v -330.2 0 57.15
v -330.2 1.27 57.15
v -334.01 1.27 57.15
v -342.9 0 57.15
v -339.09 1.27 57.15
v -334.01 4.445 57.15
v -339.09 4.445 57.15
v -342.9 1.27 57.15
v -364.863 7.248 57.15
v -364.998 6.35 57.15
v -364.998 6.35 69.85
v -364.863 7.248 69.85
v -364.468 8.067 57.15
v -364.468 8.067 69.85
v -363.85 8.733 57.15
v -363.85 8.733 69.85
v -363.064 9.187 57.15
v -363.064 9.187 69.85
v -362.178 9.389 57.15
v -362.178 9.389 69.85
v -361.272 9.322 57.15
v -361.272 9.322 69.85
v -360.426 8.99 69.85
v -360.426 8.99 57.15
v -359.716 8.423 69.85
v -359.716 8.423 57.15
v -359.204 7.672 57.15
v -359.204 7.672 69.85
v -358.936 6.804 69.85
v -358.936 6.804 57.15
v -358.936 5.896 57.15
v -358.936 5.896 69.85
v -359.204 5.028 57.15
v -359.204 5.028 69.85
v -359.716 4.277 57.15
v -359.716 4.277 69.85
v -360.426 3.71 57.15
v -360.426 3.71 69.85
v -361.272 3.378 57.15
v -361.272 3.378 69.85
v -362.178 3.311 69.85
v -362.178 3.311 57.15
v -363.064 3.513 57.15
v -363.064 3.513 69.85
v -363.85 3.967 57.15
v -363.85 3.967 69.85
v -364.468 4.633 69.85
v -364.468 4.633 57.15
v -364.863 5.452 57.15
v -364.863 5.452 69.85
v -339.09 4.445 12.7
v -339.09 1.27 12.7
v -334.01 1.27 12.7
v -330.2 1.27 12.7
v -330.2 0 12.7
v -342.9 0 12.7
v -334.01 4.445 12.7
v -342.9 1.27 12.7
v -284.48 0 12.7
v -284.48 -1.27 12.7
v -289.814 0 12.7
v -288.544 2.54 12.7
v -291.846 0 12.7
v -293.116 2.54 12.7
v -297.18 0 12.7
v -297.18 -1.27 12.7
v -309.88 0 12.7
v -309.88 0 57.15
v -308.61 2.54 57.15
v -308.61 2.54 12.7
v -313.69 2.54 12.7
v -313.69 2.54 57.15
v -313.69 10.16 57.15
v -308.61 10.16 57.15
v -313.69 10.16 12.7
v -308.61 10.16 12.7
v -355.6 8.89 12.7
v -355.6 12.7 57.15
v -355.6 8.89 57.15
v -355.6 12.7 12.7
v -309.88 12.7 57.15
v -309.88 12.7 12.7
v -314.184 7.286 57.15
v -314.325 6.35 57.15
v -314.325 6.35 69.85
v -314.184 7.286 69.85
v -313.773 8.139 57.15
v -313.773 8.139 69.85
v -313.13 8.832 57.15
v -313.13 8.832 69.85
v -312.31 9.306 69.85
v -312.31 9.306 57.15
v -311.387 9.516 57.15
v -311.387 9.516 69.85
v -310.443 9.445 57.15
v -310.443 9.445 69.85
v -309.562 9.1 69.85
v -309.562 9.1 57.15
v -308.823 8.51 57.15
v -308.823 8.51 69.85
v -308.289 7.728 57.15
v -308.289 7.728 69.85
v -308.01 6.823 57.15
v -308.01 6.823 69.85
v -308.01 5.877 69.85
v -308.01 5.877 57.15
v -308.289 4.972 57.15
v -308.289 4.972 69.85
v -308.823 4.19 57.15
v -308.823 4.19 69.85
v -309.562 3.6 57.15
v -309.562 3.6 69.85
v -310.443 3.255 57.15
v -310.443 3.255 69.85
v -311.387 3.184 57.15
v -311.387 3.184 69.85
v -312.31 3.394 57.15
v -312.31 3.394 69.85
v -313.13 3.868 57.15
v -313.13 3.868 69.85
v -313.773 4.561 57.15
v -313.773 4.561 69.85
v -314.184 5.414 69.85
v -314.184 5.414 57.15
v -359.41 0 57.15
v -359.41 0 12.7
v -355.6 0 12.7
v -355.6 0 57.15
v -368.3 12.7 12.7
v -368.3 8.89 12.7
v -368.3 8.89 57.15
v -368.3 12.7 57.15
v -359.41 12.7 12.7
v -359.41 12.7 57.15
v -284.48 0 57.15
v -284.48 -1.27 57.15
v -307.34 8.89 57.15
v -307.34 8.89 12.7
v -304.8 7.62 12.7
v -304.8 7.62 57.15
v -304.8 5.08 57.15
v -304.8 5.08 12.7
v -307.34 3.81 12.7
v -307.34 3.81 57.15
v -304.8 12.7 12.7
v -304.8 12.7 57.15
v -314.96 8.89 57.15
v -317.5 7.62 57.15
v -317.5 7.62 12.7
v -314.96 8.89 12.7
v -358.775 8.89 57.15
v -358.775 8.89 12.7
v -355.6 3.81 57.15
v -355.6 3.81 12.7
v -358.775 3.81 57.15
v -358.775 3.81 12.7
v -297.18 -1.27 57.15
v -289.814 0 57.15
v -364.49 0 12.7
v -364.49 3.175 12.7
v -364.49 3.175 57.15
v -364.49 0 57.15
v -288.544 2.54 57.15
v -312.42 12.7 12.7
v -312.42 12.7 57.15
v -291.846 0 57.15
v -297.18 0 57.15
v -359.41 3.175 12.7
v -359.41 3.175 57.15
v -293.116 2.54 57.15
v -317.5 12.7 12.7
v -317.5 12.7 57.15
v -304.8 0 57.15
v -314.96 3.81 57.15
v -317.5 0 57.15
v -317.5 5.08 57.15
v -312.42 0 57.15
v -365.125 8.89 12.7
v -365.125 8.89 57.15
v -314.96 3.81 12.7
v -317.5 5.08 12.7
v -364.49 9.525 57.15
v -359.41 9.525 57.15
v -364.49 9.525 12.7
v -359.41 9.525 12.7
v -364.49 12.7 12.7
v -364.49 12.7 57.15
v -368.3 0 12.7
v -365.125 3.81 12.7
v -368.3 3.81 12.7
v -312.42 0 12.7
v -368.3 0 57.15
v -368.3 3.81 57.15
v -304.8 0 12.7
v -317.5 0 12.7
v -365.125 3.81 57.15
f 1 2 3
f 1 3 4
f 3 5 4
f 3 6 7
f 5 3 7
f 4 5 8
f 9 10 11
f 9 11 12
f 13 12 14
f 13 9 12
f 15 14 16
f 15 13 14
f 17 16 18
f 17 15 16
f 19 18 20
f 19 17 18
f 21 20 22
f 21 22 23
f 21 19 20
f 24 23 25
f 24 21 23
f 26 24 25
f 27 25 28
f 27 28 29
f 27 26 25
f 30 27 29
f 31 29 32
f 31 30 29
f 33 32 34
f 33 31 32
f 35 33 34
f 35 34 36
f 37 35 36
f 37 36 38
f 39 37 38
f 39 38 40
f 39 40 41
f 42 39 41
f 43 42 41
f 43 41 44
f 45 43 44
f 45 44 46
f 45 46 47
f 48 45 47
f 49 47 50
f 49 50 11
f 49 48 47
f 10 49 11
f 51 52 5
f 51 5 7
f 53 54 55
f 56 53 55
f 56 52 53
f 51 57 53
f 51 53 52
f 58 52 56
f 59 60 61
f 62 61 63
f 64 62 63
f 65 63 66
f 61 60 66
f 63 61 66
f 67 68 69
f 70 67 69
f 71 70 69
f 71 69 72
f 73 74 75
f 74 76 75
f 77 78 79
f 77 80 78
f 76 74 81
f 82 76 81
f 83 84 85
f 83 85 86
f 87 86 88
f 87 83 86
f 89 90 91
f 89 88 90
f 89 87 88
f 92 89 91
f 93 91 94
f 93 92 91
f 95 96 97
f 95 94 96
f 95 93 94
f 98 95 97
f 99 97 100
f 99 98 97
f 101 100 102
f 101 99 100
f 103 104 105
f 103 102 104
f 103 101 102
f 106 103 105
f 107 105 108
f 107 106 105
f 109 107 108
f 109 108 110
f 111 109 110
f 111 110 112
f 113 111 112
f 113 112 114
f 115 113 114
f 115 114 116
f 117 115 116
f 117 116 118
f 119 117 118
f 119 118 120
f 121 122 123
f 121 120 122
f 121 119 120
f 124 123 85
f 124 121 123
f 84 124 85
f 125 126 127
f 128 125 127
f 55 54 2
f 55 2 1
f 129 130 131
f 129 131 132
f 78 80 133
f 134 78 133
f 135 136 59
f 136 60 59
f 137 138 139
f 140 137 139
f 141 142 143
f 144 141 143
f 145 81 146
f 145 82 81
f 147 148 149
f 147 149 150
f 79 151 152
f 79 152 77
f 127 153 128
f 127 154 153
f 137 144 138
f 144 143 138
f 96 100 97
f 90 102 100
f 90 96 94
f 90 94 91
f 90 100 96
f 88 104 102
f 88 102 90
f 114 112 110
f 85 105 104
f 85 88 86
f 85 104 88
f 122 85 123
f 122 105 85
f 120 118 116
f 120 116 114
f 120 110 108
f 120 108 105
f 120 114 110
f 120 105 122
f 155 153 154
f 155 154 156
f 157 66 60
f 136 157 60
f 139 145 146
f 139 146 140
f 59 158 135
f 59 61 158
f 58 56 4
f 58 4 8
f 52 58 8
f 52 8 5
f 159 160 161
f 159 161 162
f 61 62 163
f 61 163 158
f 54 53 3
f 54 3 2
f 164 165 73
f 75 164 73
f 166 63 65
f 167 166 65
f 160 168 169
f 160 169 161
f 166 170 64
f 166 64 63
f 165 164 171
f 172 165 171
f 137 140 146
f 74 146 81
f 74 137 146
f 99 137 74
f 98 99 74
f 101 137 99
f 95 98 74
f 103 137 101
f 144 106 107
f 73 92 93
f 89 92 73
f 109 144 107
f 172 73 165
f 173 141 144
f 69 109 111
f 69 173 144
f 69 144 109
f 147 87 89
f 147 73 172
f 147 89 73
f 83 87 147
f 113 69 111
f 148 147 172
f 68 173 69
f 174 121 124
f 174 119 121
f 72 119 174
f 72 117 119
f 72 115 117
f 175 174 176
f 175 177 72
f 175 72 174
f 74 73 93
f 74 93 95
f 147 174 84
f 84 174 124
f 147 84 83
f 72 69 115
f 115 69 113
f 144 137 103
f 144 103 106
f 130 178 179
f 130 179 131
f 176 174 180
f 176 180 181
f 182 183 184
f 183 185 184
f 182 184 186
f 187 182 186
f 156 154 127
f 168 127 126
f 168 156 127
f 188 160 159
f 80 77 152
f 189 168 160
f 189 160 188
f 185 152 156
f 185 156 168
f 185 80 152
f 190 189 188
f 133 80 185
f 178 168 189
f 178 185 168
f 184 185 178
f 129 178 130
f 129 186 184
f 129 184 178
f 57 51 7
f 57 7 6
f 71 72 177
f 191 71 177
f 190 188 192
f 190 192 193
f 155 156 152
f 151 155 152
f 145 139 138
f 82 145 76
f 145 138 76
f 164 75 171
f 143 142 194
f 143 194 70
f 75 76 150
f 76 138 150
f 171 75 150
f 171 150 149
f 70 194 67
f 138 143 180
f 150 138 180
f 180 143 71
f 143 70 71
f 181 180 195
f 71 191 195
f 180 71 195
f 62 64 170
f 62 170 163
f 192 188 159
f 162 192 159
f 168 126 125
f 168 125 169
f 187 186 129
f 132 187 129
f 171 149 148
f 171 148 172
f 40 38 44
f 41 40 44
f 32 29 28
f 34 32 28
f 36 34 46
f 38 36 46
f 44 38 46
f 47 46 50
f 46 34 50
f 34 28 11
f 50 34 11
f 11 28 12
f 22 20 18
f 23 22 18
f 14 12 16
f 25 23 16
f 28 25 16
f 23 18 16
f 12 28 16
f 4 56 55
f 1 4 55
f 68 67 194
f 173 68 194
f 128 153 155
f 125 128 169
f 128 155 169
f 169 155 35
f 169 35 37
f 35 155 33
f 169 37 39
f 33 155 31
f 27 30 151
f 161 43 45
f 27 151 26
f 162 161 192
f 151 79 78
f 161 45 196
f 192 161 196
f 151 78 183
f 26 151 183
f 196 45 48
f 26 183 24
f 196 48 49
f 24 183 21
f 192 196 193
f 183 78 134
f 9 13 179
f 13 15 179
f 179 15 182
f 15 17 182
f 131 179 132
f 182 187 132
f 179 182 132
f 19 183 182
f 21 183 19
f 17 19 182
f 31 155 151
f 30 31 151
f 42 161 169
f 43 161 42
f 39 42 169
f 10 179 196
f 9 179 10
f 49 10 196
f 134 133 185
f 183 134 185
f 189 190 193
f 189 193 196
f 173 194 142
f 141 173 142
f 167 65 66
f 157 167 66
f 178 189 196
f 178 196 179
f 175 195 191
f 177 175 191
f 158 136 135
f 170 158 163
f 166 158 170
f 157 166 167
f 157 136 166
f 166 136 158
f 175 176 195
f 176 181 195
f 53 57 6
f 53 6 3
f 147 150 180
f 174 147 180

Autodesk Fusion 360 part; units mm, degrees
sketch "Sketch1" plane through (0, 0, 0) normal (0, 0, 1) x (1, 0, 0)
  line L0 (0, 0) -> (1440, 0)
  line L1 (1440, 0) -> (1440, 1440)
  line L2 (1440, 1440) -> (0, 1440)
  line L3 (0, 1440) -> (0, 0)
  line L4 (720, 1620) -> (720, -180)
  line L5 (0, 0) -> (180, 0)
  line L6 (180, 0) -> (180, 180)
  line L7 (180, 180) -> (0, 180)
  line L8 (0, 180) -> (0, 0)
  line L9 (0, 0) -> (0, -100)
  line L10 (0, -100) -> (-100, -100)
  line L11 (1440, 1440) -> (1540, 1440)
  line L12 (1540, 1440) -> (1540, 1540)
  dimension "d1" = 1440
  dimension "d2" = 1440
  dimension "d7" = 180
  dimension "d8" = 180
  dimension "d9" = 100
  dimension "d10" = 100
  dimension "d11" = 100
  dimension "d12" = 100
extrude "Extrude1" add sketch "Sketch1" along normal blind 12.7 makes body 1
sketch "Sketch2" plane through (0, 0, 12.7) normal (0, 0, 1) x (-1, 0, 0)
  line L0 (0, -1440) -> (0, 0)
  line L1 (0, 0) -> (-1440, 0)
  line L2 (-1440, 0) -> (-1440, -1440)
  line L3 (-1440, -1440) -> (0, -1440)
  line L4 (0, 0) -> (-180, 0)
  line L5 (-180, 0) -> (-360, 0)
  line L6 (-360, 0) -> (-540, 0)
  line L7 (-540, 0) -> (-720, 0)
  line L8 (-720, 0) -> (-720, -1440)
  line L9 (-180, 0) -> (-180, -1440)
  line L10 (-360, 0) -> (-360, -1440)
  line L11 (-540, 0) -> (-540, -1440)
  dimension "d15" = 180
  dimension "d16" = 180
  dimension "d17" = 180
  dimension "d18" = 180
sketch "Sketch3" plane through (0, 0, 12.7) normal (0, 0, 1) x (-1, 0, 0)
sketch "Sketch4" plane through (0, 0, 12.7) normal (0, 0, 1) x (-1, 0, 0)
  line L0 (0, 0) -> (-1440, 0)
  line L1 (-1440, 0) -> (-1440, -1440)
  line L2 (-1440, -1440) -> (0, -1440)
  line L3 (0, -1440) -> (0, 0)
  line L4 (-720, 0) -> (-810, 0)
  line L5 (-810, 0) -> (-900, 0)
  line L6 (-900, 0) -> (-1080, 0)
  line L7 (-1080, 0) -> (-1260, 0)
  line L8 (0, 0) -> (0, -180)
  line L9 (0, -180) -> (0, -360)
  line L10 (0, -360) -> (0, -540)
  line L11 (0, -540) -> (0, -720)
  line L12 (0, -720) -> (0, -900)
  line L13 (0, -900) -> (0, -1080)
  line L14 (0, -1080) -> (0, -1260)
  line L15 (-1080, 0) -> (-1260, 0)
  line L16 (0, -180) -> (0, -360)
  line L17 (-720, 0) -> (-810, 0)
  line L18 (0, -1440) -> (0, 0)
  line L19 (0, -1080) -> (0, -1260)
  line L20 (-810, 0) -> (-900, 0)
  line L21 (0, -900) -> (0, -1080)
  line L22 (0, -540) -> (0, -720)
  line L23 (-900, 0) -> (-1080, 0)
  line L24 (0, 0) -> (-1440, 0)
  line L25 (0, 0) -> (0, -180)
  line L26 (-1440, -1440) -> (0, -1440)
  line L27 (0, -720) -> (0, -900)
  line L28 (-1440, 0) -> (-1440, -1440)
  line L29 (0, -360) -> (0, -540)
  line L30 (-1080, 0) -> (-1260, 0)
  line L31 (0, -180) -> (0, -360)
  line L32 (-720, 0) -> (-810, 0)
  line L33 (0, -1440) -> (0, 0)
  line L34 (0, -1080) -> (0, -1260)
  line L35 (-810, 0) -> (-900, 0)
  line L36 (0, -900) -> (0, -1080)
  line L37 (0, -540) -> (0, -720)
  line L38 (-900, 0) -> (-1080, 0)
  line L39 (0, 0) -> (-1440, 0)
  line L40 (0, 0) -> (0, -180)
  line L41 (-1440, -1440) -> (0, -1440)
  line L42 (0, -720) -> (0, -900)
  line L43 (-1440, 0) -> (-1440, -1440)
  line L44 (0, -360) -> (0, -540)
  line L45 (0, -1440) -> (-180, -1440)
  line L46 (-180, -1440) -> (-360, -1440)
  line L47 (-360, -1440) -> (-540, -1440)
  line L48 (-540, -1440) -> (-720, -1440)
  line L49 (90, -1530) -> (-1530, -1530)
  line L50 (-1530, -1530) -> (-1530, 90)
  line L51 (-1530, 90) -> (90, 90)
  line L52 (90, 90) -> (90, -1530)
  line L53 (-720, -1440) -> (-900, -1440)
  line L54 (-1440, -720) -> (-1440, -900)
  line L55 (0, -720) -> (0, -810)
  line L56 (90, 90) -> (-824.4, 90)
  line L57 (-824.4, 90) -> (-824.4, -1530)
  line L58 (-824.4, 90) -> (-1510.2, 90)
  line L59 (90, 90) -> (90, -824.4)
  line L60 (90, -824.4) -> (-1530, -824.4)
  line L61 (2170.8056, -49.2636) -> (951.6056, -49.2636)
  line L62 (951.6056, -49.2636) -> (951.6056, -2487.6636)
  line L63 (951.6056, -2487.6636) -> (2170.8056, -2487.6636)
  line L64 (2170.8056, -2487.6636) -> (2170.8056, -49.2636)
  line L65 (2170.8056, -49.2636) -> (1256.4056, -49.2636)
  line L66 (1256.4056, -49.2636) -> (1256.4056, -963.6636)
  line L67 (1256.4056, -963.6636) -> (2170.8056, -963.6636)
  line L68 (2170.8056, -963.6636) -> (2170.8056, -49.2636)
  line L69 (2170.8056, -963.6636) -> (1256.4056, -963.6636)
  line L70 (1256.4056, -963.6636) -> (1256.4056, -1674.8636)
  line L71 (1256.4056, -1674.8636) -> (2170.8056, -1674.8636)
  line L72 (2170.8056, -1674.8636) -> (2170.8056, -963.6636)
  line L73 (2170.8056, -1674.8636) -> (1256.4056, -1674.8636)
  line L74 (1256.4056, -1674.8636) -> (1256.4056, -2386.0636)
  line L75 (1256.4056, -2386.0636) -> (2170.8056, -2386.0636)
  line L76 (2170.8056, -2386.0636) -> (2170.8056, -1674.8636)
  line L77 (3790.0355, -49.382) -> (2570.8355, -49.382)
  line L78 (2570.8355, -49.382) -> (2570.8355, -2487.782)
  line L79 (2570.8355, -2487.782) -> (3790.0355, -2487.782)
  line L80 (3790.0355, -2487.782) -> (3790.0355, -49.382)
  line L81 (3790.0355, -49.382) -> (3078.8355, -49.382)
  line L82 (3078.8355, -49.382) -> (3078.8355, -760.582)
  line L83 (3078.8355, -760.582) -> (3790.0355, -760.582)
  line L84 (3790.0355, -760.582) -> (3790.0355, -49.382)
  line L85 (1256.4056, -2386.0636) -> (1256.4056, -2487.6636)
  line L86 (3078.8355, -760.582) -> (2570.8355, -760.582)
  point P0 (0, -1440)
  point P1 (-180, -1440)
  point P2 (-360, -1440)
  point P3 (0, -1260)
  point P4 (0, -1080)
  point P5 (0, -900)
  point P6 (0, -720)
  point P7 (0, -540)
  point P8 (0, -360)
  point P9 (0, -180)
  point P10 (-180, -1260)
  point P11 (-180, -1080)
  point P12 (-180, -900)
  point P13 (-180, -720)
  point P14 (-180, -540)
  point P15 (-180, -360)
  point P16 (-180, -180)
  point P17 (-180, 0)
  point P18 (-360, -1260)
  point P19 (-360, -1080)
  point P20 (-360, -900)
  point P21 (-360, -720)
  point P22 (-360, -540)
  point P23 (-360, -360)
  point P24 (-360, -180)
  point P25 (-360, 0)
  point P26 (-540, -1440)
  point P27 (-540, -1260)
  point P28 (-540, -1080)
  point P29 (-540, -900)
  point P30 (-540, -720)
  point P31 (-540, -540)
  point P32 (-540, -360)
  point P33 (-540, -180)
  point P34 (-540, 0)
  point P35 (-720, -1440)
  point P36 (-720, -1260)
  point P37 (-720, -1080)
  point P38 (-720, -900)
  point P39 (-720, -720)
  point P40 (-720, -540)
  point P41 (-720, -360)
  point P42 (-720, -180)
  point P43 (-720, 0)
  point P44 (-900, -1440)
  point P45 (-900, -1260)
  point P46 (-900, -1080)
  point P47 (-900, -900)
  point P48 (-900, -720)
  point P49 (-900, -540)
  point P50 (-900, -360)
  point P51 (-900, -180)
  point P52 (-900, 0)
  point P53 (-1080, -1440)
  point P54 (-1080, -1260)
  point P55 (-1080, -1080)
  point P56 (-1080, -900)
  point P57 (-1080, -720)
  point P58 (-1080, -540)
  point P59 (-1080, -360)
  point P60 (-1080, -180)
  point P61 (-1080, 0)
  point P62 (-1260, -1440)
  point P63 (-1260, -1260)
  point P64 (-1260, -1080)
  point P65 (-1260, -900)
  point P66 (-1260, -720)
  point P67 (-1260, -540)
  point P68 (-1260, -360)
  point P69 (-1260, -180)
  point P70 (-1260, 0)
  point P71 (-1440, -1440)
  point P72 (-1440, -1260)
  point P73 (-1440, -1080)
  point P74 (-1440, -900)
  point P75 (-1440, -720)
  point P76 (-1440, -540)
  point P77 (-1440, -360)
  point P78 (-1440, -180)
  point P79 (-1440, 0)
  dimension "d62" = 1440
  dimension "d63" = 1440
  dimension "d86" = 914.4
  dimension "d90" = 914.4
  dimension "d92" = 1219.2
  dimension "d93" = 2438.4
  dimension "d94" = 914.4
  dimension "d95" = 914.4
  dimension "d96" = 914.4
  dimension "d97" = 711.2
  dimension "d98" = 914.4
  dimension "d99" = 711.2
  dimension "d100" = 1219.2
  dimension "d101" = 2438.4
  dimension "d102" = 711.2
  dimension "d103" = 711.2
  dimension "d105" = 180
  dimension "d106" = 180
  dimension "d107" = 1440
  dimension "d108" = 705.6
  dimension "d109" = 705.6
sketch "Sketch6" plane through (0, 0, 12.7) normal (0, 0, 1) x (-1, 0, 0)
  line L0 (311.15, 0) -> (311.15, -2.54) construction
  line L1 (311.15, -2.54) -> (308.61, -2.54)
  line L2 (311.15, -2.54) -> (313.69, -2.54)
  line L3 (311.15, 0) -> (312.42, 0) construction
  line L4 (311.15, 0) -> (309.88, 0) construction
  line L5 (313.69, -2.54) -> (312.42, 0)
  line L6 (309.88, 0) -> (308.61, -2.54)
  line L7 (317.5, 0) -> (312.42, 0)
  line L8 (309.88, 0) -> (304.8, 0)
  line L9 (317.5, -6.35) -> (314.96, -6.35) construction
  line L10 (314.96, -6.35) -> (314.96, -8.89)
  line L11 (314.96, -6.35) -> (314.96, -3.81)
  line L12 (317.5, -6.35) -> (317.5, -7.62) construction
  line L13 (317.5, -6.35) -> (317.5, -5.08) construction
  line L14 (314.96, -3.81) -> (317.5, -5.08)
  line L15 (317.5, -7.62) -> (314.96, -8.89)
  line L16 (317.5, -7.62) -> (317.5, -12.7)
  line L17 (317.5, -5.08) -> (317.5, 0)
  line L18 (307.34, -6.35) -> (307.34, -8.89)
  line L19 (308.61, -10.16) -> (309.88, -12.7)
  line L20 (311.15, -10.16) -> (313.69, -10.16)
  line L21 (304.8, -6.35) -> (304.8, -5.08) construction
  line L22 (311.15, -12.7) -> (309.88, -12.7) construction
  line L23 (311.15, -10.16) -> (308.61, -10.16)
  line L24 (304.8, -6.35) -> (304.8, -7.62) construction
  line L25 (307.34, -6.35) -> (307.34, -3.81)
  line L26 (304.8, -6.35) -> (307.34, -6.35) construction
  line L27 (309.88, -12.7) -> (304.8, -12.7)
  line L28 (311.15, -12.7) -> (311.15, -10.16) construction
  line L29 (304.8, -5.08) -> (307.34, -3.81)
  line L30 (304.8, -12.7) -> (304.8, -7.62)
  line L31 (307.34, -8.89) -> (304.8, -7.62)
  line L32 (311.15, -12.7) -> (312.42, -12.7) construction
  line L33 (312.42, -12.7) -> (317.5, -12.7)
  line L34 (312.42, -12.7) -> (313.69, -10.16)
  line L35 (304.8, 0) -> (304.8, -5.08)
  line L36 (290.83, 0) -> (290.83, -2.54) construction
  line L37 (290.83, -2.54) -> (293.116, -2.54)
  line L38 (293.116, -2.54) -> (291.846, 0)
  line L39 (290.83, -2.54) -> (288.544, -2.54)
  line L40 (288.544, -2.54) -> (289.814, 0)
  line L41 (291.846, 0) -> (289.814, 0) construction
  line L42 (291.846, 0) -> (297.18, 0)
  line L43 (289.814, 0) -> (284.48, 0)
  line L44 (297.18, 0) -> (297.18, 1.27)
  line L45 (297.18, 1.27) -> (284.48, 1.27)
  line L46 (284.48, 1.27) -> (284.48, 0)
  dimension "d111" = 12.7
  dimension "d114" = 2.54
  dimension "d115" = 2.54
  dimension "d116" = 2.54
  dimension "d117" = 1.27
  dimension "d118" = 1.27
  dimension "d119" = 2.54
  dimension "d120" = 2.54
  dimension "d121" = 2.54
  dimension "d122" = 1.27
  dimension "d123" = 1.27
  dimension "d128" = 2.54
  dimension "d129" = 2.286
  dimension "d130" = 2.286
  dimension "d131" = 5.334
  dimension "d132" = 5.334
  dimension "d133" = 1.27
  dimension "d134" = 12.7
extrude "Extrude2" add sketch "Sketch6" along normal blind 44.45 separate body makes body 2 at (-292.9467, -1.27, 27.5167) makes body 3 at (-310.3033, 2.54, 42.3333)
sketch "Sketch7" plane through (0, 0, 57.15) normal (0, 0, 1) x (-1, 0, 0)
  line L0 (309.88, 0) -> (304.8, 0)
  line L1 (304.8, 0) -> (304.8, -5.08)
  line L2 (304.8, -5.08) -> (307.34, -3.81)
  line L3 (307.34, -3.81) -> (307.34, -8.89)
  line L4 (307.34, -8.89) -> (304.8, -7.62)
  line L5 (304.8, -7.62) -> (304.8, -12.7)
  line L6 (304.8, -12.7) -> (309.88, -12.7)
  line L7 (309.88, -12.7) -> (308.61, -10.16)
  line L8 (308.61, -10.16) -> (313.69, -10.16)
  line L9 (313.69, -10.16) -> (312.42, -12.7)
  line L10 (312.42, -12.7) -> (317.5, -12.7)
  line L11 (317.5, -12.7) -> (317.5, -7.62)
  line L12 (317.5, -7.62) -> (314.96, -8.89)
  line L13 (314.96, -8.89) -> (314.96, -3.81)
  line L14 (314.96, -3.81) -> (317.5, -5.08)
  line L15 (317.5, -5.08) -> (317.5, 0)
  line L16 (317.5, 0) -> (312.42, 0)
  line L17 (312.42, 0) -> (313.69, -2.54)
  line L18 (313.69, -2.54) -> (308.61, -2.54)
  line L19 (308.61, -2.54) -> (309.88, 0)
  line L20 (311.15, -10.16) -> (311.15, -2.54) construction
  line L21 (307.34, -6.35) -> (314.96, -6.35) construction
  circle A0 centre (311.15, -6.35) radius 3.175
  dimension "d137" = 6.35
extrude "Extrude3" add sketch "Sketch7" along normal blind 12.7 contours A0 bodies 3
ref_plane "WorkPlane1" through (-311.15, 6.35, 12.7) normal (0, 0, -1) x (1, 0, 0)
sketch "Sketch8" plane through (0, 0, 12.7) normal (0, 0, -1) x (-1, 0, 0)
  line L0 (355.6, 0) -> (368.3, 12.7) construction
  line L1 (368.3, 0) -> (355.6, 12.7) construction
  circle A0 centre (361.95, 6.35) radius 3.048
  line L2 (361.95, 0) -> (364.49, 0) construction
  line L3 (359.41, 0) -> (359.41, 3.175)
  line L4 (359.41, 3.175) -> (364.49, 3.175)
  line L5 (364.49, 3.175) -> (364.49, 0)
  line L6 (368.3, 6.35) -> (368.3, 3.81) construction
  line L7 (368.3, 3.81) -> (365.125, 3.81)
  line L8 (365.125, 3.81) -> (365.125, 8.89)
  line L9 (365.125, 8.89) -> (368.3, 8.89)
  line L10 (368.3, 0) -> (368.3, 3.81)
  line L11 (368.3, 0) -> (364.49, 0)
  line L12 (359.41, 0) -> (355.6, 0)
  line L13 (368.3, 8.89) -> (368.3, 12.7)
  line L14 (359.41, 12.7) -> (359.41, 9.525)
  line L15 (364.49, 12.7) -> (368.3, 12.7)
  line L16 (355.6, 12.7) -> (359.41, 12.7)
  line L17 (355.6, 12.7) -> (355.6, 8.89)
  line L18 (364.49, 9.525) -> (364.49, 12.7)
  circle A1 centre (361.95, 6.35) radius 3.048
  line L19 (359.41, 9.525) -> (364.49, 9.525)
  line L20 (358.775, 8.89) -> (355.6, 8.89)
  line L21 (355.6, 3.81) -> (358.775, 3.81)
  line L22 (355.6, 12.7) -> (368.3, 0) construction
  line L23 (355.6, 6.35) -> (355.6, 8.89) construction
  line L24 (361.95, 12.7) -> (359.41, 12.7) construction
  line L25 (358.775, 3.81) -> (358.775, 8.89)
  line L26 (355.6, 0) -> (368.3, 12.7) construction
  line L27 (355.6, 3.81) -> (355.6, 0)
  point P0 (361.95, 6.35)
  point P1 (361.95, 6.35)
  dimension "d142" = 12.7
  dimension "d143" = 12.7
  dimension "d144" = 6.096
  dimension "d147" = 5.08
  dimension "d148" = 3.175
  dimension "d150" = 3.175
  dimension "d151" = 5.08
extrude "Extrude4" add sketch "Sketch8" against normal blind 57.15 separate body contours A0 A1 makes body 4
extrude "Extrude5" add sketch "Sketch8" against normal blind 44.45 bodies 4
sketch "Sketch9" plane through (0, 0, 12.7) normal (0, 0, -1) x (-1, 0, 0)
  line L0 (342.9, 0) -> (330.2, 0)
  line L1 (342.9, 0) -> (342.9, 1.27)
  line L2 (342.9, 1.27) -> (339.09, 1.27)
  line L3 (339.09, 1.27) -> (339.09, 4.445)
  line L4 (339.09, 4.445) -> (334.01, 4.445)
  line L5 (334.01, 4.445) -> (334.01, 1.27)
  line L6 (334.01, 1.27) -> (330.2, 1.27)
  line L7 (330.2, 1.27) -> (330.2, 0)
  dimension "d156" = 12.7
  dimension "d157" = 1.27
  dimension "d158" = 3.81
  dimension "d160" = 5.08
  dimension "d161" = 3.175
extrude "Extrude6" add sketch "Sketch9" against normal blind 44.45 separate body makes body 5
hidden bodies 1
equation "d111 = ( 1 / 2 ) * 1 in"
